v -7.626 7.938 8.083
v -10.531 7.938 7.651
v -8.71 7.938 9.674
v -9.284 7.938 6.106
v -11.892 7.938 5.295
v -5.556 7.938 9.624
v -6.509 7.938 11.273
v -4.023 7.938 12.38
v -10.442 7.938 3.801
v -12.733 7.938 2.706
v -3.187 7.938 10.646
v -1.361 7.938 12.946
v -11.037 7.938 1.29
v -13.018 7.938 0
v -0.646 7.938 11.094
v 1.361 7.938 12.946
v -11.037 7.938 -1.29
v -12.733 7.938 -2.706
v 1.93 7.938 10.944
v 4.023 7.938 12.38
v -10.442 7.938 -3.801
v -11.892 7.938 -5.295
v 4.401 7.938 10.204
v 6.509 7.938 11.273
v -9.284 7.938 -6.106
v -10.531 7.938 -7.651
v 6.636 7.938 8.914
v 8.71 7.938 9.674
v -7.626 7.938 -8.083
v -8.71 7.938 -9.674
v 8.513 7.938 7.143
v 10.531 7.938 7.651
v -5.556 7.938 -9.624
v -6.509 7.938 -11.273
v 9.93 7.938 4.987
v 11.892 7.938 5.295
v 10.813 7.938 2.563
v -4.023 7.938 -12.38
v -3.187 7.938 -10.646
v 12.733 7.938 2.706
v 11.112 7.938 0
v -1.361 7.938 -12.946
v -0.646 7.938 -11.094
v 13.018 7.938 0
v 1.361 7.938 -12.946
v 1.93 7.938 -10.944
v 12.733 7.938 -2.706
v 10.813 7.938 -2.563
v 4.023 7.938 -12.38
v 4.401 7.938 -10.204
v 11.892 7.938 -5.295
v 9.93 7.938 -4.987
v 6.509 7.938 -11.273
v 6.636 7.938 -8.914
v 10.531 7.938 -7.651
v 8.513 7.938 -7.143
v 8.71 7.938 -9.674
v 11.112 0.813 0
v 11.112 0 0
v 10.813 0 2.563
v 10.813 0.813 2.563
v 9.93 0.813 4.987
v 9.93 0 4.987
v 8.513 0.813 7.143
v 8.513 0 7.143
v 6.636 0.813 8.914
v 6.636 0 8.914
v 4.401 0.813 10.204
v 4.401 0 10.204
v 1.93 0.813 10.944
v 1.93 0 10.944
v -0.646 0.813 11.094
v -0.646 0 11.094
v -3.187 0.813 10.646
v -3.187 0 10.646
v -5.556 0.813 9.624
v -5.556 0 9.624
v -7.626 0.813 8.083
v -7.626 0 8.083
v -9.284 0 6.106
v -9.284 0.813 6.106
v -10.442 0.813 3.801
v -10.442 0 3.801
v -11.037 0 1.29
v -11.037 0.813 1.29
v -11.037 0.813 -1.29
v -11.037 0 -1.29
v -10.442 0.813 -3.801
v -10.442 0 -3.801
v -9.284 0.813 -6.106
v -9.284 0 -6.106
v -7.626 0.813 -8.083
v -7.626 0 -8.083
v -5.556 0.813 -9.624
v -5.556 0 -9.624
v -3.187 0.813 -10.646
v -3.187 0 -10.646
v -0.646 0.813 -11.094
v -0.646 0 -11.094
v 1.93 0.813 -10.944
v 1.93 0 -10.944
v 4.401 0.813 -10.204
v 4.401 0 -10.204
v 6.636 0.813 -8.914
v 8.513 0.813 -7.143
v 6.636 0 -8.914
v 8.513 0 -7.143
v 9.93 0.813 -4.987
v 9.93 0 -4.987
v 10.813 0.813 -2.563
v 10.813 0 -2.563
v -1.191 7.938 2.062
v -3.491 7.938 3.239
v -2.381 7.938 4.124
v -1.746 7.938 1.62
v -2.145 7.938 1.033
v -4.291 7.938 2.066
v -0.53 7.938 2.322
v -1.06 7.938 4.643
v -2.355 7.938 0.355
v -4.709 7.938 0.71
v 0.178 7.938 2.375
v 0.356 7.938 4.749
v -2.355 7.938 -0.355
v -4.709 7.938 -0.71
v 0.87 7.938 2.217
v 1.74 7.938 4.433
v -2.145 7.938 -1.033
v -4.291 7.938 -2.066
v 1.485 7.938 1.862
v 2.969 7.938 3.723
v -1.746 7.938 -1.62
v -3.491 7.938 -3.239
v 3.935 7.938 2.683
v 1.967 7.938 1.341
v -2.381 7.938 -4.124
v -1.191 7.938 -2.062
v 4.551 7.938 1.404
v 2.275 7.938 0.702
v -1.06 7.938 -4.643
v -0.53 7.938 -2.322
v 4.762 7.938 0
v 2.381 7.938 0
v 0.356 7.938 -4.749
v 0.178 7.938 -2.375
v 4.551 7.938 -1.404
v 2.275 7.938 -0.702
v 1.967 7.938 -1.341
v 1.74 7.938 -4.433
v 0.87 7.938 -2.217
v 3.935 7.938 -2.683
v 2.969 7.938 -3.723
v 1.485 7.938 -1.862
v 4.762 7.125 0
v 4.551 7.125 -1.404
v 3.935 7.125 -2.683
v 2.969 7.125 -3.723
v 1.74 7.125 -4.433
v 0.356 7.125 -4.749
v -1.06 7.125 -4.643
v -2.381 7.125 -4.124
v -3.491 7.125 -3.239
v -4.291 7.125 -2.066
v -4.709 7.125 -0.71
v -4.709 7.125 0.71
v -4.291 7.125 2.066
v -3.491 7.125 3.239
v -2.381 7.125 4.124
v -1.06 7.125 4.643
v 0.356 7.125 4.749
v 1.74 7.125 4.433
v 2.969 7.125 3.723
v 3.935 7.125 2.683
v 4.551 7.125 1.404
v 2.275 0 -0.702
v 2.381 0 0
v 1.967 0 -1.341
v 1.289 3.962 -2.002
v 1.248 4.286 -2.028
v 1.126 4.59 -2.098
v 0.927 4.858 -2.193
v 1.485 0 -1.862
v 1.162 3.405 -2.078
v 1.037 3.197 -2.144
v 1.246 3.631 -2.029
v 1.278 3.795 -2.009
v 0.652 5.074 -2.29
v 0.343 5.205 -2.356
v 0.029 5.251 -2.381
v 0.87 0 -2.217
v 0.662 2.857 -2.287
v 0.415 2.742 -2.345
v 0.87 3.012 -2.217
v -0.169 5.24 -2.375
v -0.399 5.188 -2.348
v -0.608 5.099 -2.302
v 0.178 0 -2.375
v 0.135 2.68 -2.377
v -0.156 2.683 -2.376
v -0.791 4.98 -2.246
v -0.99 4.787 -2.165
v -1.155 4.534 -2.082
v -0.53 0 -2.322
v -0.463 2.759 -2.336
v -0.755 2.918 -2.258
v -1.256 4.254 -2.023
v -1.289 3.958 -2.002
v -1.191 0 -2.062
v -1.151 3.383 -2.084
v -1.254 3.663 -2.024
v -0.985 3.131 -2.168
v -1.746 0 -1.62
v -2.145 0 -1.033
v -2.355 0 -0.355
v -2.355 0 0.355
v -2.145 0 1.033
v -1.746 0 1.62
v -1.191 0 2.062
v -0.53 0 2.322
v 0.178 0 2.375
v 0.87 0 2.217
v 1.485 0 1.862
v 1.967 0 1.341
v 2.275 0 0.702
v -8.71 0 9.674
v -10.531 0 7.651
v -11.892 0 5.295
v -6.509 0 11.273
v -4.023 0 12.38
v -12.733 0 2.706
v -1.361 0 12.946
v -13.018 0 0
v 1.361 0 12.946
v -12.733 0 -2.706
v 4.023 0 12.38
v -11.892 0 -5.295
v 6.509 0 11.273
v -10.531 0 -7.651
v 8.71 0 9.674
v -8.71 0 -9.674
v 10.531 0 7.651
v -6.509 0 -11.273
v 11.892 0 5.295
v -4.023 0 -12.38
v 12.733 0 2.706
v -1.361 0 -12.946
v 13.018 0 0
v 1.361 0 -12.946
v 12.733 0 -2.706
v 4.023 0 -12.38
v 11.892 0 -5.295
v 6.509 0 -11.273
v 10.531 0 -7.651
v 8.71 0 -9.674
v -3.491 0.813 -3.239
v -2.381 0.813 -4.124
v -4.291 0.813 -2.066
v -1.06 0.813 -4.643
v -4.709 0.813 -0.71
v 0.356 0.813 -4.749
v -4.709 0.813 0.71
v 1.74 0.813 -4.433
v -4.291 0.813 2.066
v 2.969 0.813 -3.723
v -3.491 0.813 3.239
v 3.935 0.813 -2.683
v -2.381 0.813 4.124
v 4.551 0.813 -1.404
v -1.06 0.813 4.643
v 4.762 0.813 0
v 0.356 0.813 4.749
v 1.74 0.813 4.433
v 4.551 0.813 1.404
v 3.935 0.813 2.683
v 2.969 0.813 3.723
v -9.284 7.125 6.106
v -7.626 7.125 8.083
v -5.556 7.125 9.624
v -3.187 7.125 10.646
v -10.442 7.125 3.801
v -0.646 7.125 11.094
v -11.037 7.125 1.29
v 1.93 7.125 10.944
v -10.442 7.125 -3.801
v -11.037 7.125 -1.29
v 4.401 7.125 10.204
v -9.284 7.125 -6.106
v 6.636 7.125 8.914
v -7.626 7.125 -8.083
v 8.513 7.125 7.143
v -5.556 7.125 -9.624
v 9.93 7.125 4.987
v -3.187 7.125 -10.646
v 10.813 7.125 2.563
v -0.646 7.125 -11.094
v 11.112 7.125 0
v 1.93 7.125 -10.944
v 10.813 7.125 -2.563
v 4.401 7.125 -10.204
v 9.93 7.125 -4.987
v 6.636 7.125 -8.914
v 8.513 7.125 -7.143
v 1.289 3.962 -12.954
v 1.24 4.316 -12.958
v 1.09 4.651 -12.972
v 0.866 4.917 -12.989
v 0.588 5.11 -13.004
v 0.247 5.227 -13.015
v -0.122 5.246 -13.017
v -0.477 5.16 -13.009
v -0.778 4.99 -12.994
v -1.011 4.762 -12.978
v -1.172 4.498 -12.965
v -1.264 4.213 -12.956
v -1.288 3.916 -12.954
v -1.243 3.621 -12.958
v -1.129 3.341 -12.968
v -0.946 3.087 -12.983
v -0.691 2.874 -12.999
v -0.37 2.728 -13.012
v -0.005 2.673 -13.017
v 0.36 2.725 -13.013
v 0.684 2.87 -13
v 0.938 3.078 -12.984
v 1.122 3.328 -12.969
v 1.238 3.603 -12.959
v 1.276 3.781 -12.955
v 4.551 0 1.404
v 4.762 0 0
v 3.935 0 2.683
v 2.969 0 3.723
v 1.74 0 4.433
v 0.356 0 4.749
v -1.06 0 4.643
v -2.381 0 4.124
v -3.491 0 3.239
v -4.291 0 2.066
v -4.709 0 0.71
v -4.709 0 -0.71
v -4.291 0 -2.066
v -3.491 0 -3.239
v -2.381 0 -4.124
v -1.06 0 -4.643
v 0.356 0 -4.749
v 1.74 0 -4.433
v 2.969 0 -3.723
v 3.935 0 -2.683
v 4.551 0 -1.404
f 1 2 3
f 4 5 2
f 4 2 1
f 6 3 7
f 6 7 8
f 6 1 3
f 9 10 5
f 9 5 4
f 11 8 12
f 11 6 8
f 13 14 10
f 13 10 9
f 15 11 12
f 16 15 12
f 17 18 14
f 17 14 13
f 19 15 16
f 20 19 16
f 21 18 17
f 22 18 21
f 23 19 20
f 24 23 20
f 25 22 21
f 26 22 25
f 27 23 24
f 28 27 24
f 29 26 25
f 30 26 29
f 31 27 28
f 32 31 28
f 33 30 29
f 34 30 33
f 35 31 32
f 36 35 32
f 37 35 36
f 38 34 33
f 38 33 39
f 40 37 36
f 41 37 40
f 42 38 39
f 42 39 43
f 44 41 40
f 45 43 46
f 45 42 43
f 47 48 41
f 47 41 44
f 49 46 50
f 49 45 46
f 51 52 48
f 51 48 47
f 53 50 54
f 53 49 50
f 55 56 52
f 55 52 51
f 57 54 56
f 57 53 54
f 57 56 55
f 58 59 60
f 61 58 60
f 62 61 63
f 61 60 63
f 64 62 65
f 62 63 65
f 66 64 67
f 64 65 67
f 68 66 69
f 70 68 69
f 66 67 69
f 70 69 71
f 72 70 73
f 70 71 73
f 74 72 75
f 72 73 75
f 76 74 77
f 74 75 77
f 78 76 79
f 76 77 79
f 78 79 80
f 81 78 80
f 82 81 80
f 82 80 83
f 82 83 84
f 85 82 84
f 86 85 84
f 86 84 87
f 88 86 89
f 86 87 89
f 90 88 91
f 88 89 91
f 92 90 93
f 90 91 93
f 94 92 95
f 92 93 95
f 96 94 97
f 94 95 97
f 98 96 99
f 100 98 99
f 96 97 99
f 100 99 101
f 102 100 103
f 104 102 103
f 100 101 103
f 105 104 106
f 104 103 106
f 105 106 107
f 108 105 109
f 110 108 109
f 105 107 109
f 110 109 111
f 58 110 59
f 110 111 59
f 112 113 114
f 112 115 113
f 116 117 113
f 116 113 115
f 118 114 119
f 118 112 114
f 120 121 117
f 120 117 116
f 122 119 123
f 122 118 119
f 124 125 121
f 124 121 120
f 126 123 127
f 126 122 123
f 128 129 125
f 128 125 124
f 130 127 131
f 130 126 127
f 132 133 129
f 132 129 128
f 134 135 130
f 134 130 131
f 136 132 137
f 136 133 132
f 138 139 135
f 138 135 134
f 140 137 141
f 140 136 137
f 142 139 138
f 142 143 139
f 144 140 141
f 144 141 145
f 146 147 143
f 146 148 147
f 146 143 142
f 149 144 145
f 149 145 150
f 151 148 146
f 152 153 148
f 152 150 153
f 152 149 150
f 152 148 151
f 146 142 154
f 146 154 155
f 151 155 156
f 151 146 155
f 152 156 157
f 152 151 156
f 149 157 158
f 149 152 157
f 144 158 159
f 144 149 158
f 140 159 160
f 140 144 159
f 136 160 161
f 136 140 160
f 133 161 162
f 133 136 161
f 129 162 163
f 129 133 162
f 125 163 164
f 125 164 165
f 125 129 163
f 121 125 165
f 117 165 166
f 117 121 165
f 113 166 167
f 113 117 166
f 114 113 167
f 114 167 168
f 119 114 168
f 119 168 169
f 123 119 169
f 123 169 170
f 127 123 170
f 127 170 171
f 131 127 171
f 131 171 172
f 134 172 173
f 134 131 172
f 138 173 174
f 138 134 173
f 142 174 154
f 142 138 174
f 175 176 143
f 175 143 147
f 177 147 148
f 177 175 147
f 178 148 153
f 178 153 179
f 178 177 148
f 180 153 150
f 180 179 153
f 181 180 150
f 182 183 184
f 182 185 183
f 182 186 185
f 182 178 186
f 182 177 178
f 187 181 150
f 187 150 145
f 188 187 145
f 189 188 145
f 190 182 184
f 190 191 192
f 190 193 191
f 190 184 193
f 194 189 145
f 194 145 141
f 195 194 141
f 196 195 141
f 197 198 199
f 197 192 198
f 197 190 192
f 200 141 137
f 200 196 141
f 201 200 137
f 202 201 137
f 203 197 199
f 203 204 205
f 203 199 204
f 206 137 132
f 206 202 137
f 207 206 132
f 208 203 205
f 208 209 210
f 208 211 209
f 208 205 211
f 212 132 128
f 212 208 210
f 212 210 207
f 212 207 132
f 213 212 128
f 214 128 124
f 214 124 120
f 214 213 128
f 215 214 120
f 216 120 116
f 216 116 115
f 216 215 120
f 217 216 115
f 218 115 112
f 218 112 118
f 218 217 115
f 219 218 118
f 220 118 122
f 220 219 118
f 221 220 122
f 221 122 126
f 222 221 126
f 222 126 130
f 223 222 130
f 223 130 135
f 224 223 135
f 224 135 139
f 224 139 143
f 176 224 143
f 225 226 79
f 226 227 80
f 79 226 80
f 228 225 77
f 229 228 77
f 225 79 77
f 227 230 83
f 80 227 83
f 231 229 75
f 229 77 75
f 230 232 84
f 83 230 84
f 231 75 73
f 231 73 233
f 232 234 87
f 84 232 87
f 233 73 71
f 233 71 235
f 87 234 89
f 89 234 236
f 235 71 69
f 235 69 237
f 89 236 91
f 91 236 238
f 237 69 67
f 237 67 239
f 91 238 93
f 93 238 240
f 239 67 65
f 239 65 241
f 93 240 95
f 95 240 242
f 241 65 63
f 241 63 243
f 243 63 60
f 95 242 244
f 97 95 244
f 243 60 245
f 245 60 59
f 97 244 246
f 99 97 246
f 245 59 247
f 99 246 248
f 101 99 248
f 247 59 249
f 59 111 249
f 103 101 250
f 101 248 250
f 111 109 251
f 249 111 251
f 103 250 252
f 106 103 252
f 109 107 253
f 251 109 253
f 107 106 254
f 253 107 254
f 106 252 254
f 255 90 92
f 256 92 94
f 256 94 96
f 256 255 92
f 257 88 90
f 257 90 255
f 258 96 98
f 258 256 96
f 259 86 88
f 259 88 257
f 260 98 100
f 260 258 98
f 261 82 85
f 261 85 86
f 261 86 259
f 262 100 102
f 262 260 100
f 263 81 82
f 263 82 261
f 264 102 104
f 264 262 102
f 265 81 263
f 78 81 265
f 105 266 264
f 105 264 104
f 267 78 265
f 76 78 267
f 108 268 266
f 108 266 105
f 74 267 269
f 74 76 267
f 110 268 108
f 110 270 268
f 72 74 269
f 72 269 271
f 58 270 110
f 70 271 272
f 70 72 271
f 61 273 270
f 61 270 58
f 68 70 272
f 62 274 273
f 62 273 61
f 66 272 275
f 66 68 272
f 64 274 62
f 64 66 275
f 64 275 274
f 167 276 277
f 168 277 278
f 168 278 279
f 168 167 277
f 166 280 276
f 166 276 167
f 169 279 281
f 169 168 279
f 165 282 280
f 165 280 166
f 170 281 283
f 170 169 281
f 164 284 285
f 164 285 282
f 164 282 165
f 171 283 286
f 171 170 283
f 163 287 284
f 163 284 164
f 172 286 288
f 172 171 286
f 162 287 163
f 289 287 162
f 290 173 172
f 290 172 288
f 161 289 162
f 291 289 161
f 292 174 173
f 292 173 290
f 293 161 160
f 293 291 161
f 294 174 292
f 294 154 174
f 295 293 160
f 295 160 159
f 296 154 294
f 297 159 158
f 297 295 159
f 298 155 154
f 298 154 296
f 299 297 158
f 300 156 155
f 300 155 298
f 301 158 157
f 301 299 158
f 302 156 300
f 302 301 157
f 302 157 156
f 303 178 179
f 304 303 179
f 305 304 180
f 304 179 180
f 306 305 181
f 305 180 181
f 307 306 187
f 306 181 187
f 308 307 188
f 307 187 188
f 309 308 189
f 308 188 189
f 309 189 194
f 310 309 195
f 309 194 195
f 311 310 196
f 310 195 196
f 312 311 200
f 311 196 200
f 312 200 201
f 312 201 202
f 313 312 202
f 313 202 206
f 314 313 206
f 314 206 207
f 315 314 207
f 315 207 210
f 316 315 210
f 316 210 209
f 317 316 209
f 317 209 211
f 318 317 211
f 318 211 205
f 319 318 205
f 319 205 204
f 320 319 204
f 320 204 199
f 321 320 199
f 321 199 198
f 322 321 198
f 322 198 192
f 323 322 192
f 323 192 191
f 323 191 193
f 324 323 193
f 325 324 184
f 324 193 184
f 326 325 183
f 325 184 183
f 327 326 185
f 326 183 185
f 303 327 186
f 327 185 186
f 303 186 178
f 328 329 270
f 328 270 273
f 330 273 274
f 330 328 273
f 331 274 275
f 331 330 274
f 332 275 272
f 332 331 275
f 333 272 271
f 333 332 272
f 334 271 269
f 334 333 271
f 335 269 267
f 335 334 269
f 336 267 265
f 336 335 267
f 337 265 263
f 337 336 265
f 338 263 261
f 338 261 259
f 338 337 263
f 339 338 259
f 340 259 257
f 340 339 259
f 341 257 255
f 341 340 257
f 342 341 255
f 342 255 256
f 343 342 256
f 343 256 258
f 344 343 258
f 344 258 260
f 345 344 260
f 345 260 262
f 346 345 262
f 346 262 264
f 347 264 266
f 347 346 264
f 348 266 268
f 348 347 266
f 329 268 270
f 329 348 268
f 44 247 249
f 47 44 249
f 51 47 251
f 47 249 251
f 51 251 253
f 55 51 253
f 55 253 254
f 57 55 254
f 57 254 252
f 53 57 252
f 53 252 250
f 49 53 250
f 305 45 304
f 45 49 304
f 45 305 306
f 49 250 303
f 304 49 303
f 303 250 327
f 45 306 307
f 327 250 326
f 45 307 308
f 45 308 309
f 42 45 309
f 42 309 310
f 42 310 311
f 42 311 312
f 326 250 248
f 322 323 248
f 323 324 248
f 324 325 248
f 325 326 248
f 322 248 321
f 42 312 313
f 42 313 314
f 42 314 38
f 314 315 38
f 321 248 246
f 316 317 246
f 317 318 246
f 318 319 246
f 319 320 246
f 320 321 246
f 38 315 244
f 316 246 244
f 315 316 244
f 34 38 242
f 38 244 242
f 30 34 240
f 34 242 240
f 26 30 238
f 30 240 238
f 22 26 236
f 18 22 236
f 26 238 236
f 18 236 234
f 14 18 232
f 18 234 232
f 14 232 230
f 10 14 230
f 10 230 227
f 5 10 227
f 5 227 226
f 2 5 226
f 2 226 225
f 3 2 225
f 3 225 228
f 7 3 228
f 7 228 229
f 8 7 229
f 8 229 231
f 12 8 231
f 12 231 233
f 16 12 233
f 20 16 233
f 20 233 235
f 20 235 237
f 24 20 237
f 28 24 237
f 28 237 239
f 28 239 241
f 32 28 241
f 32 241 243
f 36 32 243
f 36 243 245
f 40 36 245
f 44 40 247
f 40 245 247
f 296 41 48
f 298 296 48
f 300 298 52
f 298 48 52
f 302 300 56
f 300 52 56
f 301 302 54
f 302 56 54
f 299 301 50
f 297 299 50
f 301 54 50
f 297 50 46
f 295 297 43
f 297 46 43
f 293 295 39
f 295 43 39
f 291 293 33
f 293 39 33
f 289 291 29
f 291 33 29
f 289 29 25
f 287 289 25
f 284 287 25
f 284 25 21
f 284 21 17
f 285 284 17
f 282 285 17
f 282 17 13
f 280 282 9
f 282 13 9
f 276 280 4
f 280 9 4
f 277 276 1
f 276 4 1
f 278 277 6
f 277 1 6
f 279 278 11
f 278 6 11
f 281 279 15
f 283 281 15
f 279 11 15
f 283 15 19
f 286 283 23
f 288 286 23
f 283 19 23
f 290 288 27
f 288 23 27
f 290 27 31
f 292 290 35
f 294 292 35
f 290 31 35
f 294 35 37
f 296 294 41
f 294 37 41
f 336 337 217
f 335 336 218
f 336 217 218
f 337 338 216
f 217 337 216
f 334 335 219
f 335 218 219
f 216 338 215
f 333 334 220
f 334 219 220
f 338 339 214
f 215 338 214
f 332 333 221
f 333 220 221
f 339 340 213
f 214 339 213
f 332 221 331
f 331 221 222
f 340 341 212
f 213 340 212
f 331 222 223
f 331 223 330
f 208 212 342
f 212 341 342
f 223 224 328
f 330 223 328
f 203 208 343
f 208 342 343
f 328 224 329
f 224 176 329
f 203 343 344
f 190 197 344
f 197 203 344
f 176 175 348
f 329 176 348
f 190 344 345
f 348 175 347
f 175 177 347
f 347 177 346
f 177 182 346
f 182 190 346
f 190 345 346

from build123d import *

# Parameters (mm, degrees)
SKETCH1_R           = 13.0175
SKETCH1_R_2         = 2.38125
BOSS_EXTRUDE1_DEPTH = 7.9375
SKETCH2_R           = 11.1125
SKETCH2_R_2         = 4.7625
CUT_EXTRUDE1_DEPTH  = 0.8128
SKETCH3_R           = 11.1125
SKETCH3_R_2         = 4.7625
CUT_EXTRUDE2_DEPTH  = 0.8128
SKETCH4_R           = 1.28905
CUT_EXTRUDE3_DEPTH  = 14.0175


with BuildPart() as part:
    # Sketch1 → Boss-Extrude1 (new body)
    with BuildSketch(Plane(origin=(0, 0, 0), x_dir=(1, 0, 0), z_dir=(0, 1, 0))):
        Circle(SKETCH1_R)
        Circle(SKETCH1_R_2, mode=Mode.SUBTRACT)
    extrude(amount=BOSS_EXTRUDE1_DEPTH)

    # Sketch2 → Cut-Extrude1 (cut)
    with BuildSketch(Plane(origin=(0, 7.9375, 0), x_dir=(1, 0, 0), z_dir=(0, 1, 0))):
        Circle(SKETCH2_R)
        Circle(SKETCH2_R_2, mode=Mode.SUBTRACT)
    extrude(amount=-CUT_EXTRUDE1_DEPTH, mode=Mode.SUBTRACT)

    # Sketch3 → Cut-Extrude2 (cut)
    with BuildSketch(Plane.XZ):
        Circle(SKETCH3_R)
        Circle(SKETCH3_R_2, mode=Mode.SUBTRACT)
    extrude(amount=-CUT_EXTRUDE2_DEPTH, mode=Mode.SUBTRACT)

    # Sketch4 → Cut-Extrude3 (cut, through all)
    with BuildSketch(Plane.XY):
        with Locations((0, 3.9624)):
            Circle(SKETCH4_R)
    extrude(amount=-CUT_EXTRUDE3_DEPTH, mode=Mode.SUBTRACT)


solid = part.part
